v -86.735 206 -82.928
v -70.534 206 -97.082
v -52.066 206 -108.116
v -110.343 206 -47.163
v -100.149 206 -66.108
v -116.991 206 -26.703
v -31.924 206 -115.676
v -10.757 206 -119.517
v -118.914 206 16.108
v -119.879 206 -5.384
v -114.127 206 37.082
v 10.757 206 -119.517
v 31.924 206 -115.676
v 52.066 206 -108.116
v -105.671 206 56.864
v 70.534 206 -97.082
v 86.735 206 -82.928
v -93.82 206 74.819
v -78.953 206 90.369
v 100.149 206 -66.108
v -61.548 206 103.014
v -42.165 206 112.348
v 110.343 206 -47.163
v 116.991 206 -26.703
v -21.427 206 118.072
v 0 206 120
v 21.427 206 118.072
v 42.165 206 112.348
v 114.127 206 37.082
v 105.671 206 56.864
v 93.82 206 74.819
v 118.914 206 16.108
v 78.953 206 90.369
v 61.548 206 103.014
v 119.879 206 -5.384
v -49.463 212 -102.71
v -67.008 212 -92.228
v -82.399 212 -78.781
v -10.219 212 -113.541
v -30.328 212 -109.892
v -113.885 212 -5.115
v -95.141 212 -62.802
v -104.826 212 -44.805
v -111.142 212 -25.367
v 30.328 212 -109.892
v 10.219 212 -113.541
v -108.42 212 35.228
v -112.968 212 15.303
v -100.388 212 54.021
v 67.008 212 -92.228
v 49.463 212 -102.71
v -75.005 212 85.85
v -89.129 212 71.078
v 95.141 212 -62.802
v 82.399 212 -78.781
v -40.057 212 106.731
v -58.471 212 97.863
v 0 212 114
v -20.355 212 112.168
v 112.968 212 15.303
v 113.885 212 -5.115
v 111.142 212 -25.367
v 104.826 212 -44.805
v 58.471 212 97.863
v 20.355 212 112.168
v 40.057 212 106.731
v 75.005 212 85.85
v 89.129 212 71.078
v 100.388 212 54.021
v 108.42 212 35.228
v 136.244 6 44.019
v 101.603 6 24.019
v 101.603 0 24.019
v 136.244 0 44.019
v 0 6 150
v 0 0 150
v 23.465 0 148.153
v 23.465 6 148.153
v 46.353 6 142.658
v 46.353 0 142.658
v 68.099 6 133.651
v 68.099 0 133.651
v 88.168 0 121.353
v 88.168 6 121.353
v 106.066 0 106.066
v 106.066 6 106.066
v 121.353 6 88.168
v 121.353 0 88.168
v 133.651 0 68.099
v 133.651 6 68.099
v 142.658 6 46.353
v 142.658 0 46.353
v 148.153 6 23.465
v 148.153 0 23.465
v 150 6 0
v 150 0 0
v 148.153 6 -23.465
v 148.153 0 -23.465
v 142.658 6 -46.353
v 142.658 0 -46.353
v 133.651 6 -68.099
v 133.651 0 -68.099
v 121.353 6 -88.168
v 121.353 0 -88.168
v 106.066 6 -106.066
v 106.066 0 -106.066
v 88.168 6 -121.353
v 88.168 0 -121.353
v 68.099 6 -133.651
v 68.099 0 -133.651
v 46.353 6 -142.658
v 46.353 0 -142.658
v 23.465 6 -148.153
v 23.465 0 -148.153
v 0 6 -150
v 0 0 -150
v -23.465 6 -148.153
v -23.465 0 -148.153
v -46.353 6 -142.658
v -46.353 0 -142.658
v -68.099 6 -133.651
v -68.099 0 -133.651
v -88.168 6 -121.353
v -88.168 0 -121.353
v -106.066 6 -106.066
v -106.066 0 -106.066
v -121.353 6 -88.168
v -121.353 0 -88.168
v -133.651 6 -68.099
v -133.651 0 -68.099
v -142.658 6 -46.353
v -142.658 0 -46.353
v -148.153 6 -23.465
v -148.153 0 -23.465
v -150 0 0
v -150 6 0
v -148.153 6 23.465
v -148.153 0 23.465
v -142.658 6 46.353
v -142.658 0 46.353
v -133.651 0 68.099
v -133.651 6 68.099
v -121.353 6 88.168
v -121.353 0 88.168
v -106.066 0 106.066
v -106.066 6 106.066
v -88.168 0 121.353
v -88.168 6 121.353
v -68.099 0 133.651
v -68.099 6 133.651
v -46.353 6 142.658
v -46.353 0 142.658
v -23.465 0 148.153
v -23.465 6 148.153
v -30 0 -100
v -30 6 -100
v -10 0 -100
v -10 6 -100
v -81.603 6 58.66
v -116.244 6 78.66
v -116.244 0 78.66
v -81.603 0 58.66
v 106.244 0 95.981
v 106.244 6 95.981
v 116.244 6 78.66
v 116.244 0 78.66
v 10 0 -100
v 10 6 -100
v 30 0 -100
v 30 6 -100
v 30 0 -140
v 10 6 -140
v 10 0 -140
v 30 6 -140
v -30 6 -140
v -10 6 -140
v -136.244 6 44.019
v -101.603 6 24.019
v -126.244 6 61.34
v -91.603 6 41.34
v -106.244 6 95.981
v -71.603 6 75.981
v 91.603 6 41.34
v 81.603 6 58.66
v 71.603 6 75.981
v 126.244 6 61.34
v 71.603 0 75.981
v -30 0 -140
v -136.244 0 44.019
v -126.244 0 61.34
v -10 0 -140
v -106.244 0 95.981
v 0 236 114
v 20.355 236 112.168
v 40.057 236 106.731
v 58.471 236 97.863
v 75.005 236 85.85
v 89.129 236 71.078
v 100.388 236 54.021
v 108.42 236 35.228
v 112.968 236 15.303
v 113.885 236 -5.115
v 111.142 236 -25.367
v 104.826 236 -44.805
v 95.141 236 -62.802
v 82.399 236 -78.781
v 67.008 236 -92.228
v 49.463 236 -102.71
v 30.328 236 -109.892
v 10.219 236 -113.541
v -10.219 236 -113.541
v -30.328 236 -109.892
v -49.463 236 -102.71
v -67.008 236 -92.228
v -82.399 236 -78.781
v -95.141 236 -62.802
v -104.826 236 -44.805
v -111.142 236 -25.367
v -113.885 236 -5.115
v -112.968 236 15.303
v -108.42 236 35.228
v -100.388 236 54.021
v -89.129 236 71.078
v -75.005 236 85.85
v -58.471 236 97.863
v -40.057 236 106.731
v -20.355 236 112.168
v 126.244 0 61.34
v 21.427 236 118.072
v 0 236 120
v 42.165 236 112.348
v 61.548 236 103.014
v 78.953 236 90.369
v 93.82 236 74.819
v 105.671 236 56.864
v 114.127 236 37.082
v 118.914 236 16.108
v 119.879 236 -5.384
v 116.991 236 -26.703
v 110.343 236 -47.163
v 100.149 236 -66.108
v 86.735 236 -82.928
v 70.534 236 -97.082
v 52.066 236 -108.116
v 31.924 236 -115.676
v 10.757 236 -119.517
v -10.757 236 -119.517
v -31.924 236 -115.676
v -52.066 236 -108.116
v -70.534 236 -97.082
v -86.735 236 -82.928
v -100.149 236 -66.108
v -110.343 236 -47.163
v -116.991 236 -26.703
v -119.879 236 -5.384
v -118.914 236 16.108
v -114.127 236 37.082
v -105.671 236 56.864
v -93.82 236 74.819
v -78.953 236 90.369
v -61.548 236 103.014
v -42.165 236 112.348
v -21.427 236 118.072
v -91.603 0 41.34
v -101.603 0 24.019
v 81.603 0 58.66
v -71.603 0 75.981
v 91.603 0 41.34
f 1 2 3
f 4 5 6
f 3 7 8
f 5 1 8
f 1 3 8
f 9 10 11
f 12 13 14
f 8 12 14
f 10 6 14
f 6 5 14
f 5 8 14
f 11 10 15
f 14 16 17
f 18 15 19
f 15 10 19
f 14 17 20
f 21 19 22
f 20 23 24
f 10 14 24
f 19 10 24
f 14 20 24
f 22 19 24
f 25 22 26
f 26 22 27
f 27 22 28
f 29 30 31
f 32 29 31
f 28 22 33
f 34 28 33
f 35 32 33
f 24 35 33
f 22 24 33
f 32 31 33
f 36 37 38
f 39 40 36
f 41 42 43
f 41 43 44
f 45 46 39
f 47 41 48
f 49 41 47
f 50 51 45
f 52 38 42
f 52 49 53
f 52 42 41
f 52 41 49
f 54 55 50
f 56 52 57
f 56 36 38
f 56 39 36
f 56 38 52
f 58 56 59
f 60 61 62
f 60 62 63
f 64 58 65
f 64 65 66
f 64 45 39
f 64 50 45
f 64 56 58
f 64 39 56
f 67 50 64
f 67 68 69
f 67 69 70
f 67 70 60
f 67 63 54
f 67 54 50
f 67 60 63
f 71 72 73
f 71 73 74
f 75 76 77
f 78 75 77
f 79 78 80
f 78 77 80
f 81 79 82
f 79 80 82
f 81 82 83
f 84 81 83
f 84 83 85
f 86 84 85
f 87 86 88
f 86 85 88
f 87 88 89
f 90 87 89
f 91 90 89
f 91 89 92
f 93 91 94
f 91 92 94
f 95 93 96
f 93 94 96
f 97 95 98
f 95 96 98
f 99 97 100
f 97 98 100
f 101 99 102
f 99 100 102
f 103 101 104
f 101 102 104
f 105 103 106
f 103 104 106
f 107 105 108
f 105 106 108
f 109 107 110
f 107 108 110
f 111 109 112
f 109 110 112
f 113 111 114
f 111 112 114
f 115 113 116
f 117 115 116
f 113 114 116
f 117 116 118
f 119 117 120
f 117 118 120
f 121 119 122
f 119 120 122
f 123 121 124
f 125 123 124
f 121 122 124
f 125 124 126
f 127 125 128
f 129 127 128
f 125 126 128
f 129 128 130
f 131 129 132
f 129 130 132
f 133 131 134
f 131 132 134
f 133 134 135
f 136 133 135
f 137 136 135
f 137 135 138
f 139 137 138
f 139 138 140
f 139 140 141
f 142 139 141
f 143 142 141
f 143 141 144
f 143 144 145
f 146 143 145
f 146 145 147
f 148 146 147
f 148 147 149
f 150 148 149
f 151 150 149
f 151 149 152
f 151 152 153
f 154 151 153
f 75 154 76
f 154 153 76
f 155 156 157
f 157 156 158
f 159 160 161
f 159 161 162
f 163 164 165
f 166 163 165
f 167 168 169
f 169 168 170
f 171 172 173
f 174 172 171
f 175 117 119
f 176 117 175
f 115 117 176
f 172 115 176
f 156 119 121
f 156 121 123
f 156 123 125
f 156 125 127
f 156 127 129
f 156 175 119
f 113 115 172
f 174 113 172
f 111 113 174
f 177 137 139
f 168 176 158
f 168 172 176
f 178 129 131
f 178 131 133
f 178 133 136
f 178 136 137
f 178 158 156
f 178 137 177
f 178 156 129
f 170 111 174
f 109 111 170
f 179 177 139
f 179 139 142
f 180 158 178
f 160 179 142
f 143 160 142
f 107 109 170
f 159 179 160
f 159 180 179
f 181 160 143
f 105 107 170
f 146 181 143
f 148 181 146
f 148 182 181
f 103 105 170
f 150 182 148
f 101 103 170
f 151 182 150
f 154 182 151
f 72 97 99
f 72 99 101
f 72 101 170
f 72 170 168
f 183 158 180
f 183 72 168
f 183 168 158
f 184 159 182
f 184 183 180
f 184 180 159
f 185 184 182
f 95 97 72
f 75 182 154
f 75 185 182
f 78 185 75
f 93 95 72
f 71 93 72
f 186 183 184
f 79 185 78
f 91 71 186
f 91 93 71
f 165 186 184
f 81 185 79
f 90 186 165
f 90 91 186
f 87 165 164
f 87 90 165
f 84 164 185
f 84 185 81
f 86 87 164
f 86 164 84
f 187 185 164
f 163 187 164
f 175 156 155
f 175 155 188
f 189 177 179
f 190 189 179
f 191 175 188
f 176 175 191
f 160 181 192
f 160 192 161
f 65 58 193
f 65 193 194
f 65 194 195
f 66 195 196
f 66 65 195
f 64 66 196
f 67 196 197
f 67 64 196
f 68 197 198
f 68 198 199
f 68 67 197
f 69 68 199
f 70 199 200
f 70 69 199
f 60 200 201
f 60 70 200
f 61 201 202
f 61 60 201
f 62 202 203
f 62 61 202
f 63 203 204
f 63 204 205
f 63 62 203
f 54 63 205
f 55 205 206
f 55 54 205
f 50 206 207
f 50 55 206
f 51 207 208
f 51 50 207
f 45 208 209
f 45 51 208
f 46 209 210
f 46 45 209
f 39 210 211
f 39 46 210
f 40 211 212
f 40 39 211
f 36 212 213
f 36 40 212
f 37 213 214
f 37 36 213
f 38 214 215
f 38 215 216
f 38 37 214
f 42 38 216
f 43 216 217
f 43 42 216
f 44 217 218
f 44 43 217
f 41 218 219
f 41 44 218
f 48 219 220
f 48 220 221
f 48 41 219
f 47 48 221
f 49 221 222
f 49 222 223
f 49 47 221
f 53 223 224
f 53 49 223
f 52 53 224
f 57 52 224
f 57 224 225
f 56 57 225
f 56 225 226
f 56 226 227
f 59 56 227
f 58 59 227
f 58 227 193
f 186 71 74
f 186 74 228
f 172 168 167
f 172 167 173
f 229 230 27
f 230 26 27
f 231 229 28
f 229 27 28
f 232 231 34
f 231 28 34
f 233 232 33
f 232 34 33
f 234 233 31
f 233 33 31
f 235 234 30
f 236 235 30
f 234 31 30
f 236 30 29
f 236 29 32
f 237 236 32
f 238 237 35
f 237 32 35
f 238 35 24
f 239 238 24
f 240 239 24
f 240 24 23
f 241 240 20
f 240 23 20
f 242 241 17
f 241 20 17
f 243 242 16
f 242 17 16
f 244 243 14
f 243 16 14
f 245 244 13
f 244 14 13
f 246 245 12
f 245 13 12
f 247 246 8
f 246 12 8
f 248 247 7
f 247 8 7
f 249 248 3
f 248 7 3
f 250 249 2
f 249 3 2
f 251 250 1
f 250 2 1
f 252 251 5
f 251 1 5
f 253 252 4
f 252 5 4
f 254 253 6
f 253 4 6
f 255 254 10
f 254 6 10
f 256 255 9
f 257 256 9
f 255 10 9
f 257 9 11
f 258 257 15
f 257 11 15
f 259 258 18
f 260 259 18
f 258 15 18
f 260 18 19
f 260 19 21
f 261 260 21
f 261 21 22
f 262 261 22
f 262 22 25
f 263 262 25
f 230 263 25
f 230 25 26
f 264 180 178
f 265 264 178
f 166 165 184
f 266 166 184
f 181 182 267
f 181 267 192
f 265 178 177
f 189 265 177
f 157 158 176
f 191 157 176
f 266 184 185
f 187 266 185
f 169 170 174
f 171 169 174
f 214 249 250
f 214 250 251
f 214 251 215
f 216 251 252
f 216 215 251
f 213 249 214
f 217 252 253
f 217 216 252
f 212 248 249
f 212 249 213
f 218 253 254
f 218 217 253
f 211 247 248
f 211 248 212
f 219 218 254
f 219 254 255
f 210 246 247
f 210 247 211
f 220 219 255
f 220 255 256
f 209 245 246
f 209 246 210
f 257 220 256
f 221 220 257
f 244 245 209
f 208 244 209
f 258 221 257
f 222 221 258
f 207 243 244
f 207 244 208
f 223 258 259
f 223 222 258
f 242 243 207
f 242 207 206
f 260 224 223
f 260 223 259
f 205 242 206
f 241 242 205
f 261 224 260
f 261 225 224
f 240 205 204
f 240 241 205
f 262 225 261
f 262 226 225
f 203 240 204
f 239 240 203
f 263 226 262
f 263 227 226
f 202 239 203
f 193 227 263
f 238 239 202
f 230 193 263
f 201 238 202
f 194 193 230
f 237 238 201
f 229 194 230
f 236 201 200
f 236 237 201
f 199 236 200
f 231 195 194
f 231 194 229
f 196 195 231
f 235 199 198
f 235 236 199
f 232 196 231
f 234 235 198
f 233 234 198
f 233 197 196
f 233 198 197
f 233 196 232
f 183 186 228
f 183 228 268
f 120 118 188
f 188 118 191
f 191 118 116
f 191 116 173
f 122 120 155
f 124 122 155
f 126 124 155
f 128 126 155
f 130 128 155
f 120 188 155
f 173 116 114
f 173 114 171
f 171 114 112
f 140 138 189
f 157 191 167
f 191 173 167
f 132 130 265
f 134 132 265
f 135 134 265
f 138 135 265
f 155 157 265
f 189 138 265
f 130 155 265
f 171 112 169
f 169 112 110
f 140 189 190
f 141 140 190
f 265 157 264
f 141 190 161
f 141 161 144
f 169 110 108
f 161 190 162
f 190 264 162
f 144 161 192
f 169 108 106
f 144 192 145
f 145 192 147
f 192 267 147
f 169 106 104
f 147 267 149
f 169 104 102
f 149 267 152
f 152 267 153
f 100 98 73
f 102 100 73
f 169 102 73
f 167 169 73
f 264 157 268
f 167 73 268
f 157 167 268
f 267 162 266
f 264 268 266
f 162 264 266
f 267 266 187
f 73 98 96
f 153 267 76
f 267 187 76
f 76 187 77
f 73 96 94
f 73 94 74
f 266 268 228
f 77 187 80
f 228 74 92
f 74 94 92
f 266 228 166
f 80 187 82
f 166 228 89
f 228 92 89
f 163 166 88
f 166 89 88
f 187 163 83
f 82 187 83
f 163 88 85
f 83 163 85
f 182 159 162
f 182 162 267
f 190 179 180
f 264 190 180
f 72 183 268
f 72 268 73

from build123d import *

# Parameters (mm, degrees)
SKETCH1_R           = 150
BOSS_EXTRUDE1_DEPTH = 6
SKETCH2_W           = 20
SKETCH2_H           = 40
CUT_EXTRUDE1_DEPTH  = 6
SKETCH3_R           = 120
BOSS_EXTRUDE2_DEPTH = 6
SKETCH5_R           = 120
SKETCH5_R_2         = 114
BOSS_EXTRUDE4_DEPTH = 24


with BuildPart() as part:
    # Sketch1 → Boss-Extrude1 (new body)
    with BuildSketch(Plane(origin=(0, 0, 0), x_dir=(1, 0, 0), z_dir=(0, 1, 0))):
        with Locations(Location((0, 0, 0), (0, 0, 270))):  # turned: the seam where the file's is
            Circle(SKETCH1_R)
    extrude(amount=BOSS_EXTRUDE1_DEPTH)

    # Sketch2 → Cut-Extrude1 (cut)
    with BuildSketch(Plane(origin=(0, 6, 0), x_dir=(1, 0, 0), z_dir=(0, 1, 0))):
        with Locations((-20, 120)):
            Rectangle(SKETCH2_W, SKETCH2_H)
        with Locations((20, 120)):
            Rectangle(SKETCH2_W, SKETCH2_H)
        Polygon((126.24355653, -61.339745962), (91.602540378, -41.339745962), (101.602540378, -24.019237886), (136.24355653, -44.019237886), align=None)
        Polygon((116.24355653, -78.660254038), (81.602540378, -58.660254038), (71.602540378, -75.980762114), (106.24355653, -95.980762114), align=None)
        Polygon((-116.24355653, -78.660254038), (-81.602540378, -58.660254038), (-71.602540378, -75.980762114), (-106.24355653, -95.980762114), align=None)
        Polygon((-126.24355653, -61.339745962), (-91.602540378, -41.339745962), (-101.602540378, -24.019237886), (-136.24355653, -44.019237886), align=None)
    extrude(amount=-CUT_EXTRUDE1_DEPTH, mode=Mode.SUBTRACT)


with BuildPart() as body_2:
    # Sketch3 → Boss-Extrude2 (new body)
    with BuildSketch(Plane(origin=(0, 206, 0), x_dir=(1, 0, 0), z_dir=(0, 1, 0))):
        with Locations(Location((0, 0, 0), (0, 0, 270))):  # turned: the seam where the file's is
            Circle(SKETCH3_R)
    extrude(amount=BOSS_EXTRUDE2_DEPTH)

    # Sketch5 → Boss-Extrude4 (add)
    with BuildSketch(Plane(origin=(0, 212, 0), x_dir=(1, 0, 0), z_dir=(0, 1, 0))):
        with Locations(Location((0, 0, 0), (0, 0, 270))):  # turned: the seam where the file's is
            Circle(SKETCH5_R)
        with Locations(Location((0, 0, 0), (0, 0, 270))):  # turned: the seam where the file's is
            Circle(SKETCH5_R_2, mode=Mode.SUBTRACT)
    extrude(amount=BOSS_EXTRUDE4_DEPTH)


solid = Compound([part.part, body_2.part])
